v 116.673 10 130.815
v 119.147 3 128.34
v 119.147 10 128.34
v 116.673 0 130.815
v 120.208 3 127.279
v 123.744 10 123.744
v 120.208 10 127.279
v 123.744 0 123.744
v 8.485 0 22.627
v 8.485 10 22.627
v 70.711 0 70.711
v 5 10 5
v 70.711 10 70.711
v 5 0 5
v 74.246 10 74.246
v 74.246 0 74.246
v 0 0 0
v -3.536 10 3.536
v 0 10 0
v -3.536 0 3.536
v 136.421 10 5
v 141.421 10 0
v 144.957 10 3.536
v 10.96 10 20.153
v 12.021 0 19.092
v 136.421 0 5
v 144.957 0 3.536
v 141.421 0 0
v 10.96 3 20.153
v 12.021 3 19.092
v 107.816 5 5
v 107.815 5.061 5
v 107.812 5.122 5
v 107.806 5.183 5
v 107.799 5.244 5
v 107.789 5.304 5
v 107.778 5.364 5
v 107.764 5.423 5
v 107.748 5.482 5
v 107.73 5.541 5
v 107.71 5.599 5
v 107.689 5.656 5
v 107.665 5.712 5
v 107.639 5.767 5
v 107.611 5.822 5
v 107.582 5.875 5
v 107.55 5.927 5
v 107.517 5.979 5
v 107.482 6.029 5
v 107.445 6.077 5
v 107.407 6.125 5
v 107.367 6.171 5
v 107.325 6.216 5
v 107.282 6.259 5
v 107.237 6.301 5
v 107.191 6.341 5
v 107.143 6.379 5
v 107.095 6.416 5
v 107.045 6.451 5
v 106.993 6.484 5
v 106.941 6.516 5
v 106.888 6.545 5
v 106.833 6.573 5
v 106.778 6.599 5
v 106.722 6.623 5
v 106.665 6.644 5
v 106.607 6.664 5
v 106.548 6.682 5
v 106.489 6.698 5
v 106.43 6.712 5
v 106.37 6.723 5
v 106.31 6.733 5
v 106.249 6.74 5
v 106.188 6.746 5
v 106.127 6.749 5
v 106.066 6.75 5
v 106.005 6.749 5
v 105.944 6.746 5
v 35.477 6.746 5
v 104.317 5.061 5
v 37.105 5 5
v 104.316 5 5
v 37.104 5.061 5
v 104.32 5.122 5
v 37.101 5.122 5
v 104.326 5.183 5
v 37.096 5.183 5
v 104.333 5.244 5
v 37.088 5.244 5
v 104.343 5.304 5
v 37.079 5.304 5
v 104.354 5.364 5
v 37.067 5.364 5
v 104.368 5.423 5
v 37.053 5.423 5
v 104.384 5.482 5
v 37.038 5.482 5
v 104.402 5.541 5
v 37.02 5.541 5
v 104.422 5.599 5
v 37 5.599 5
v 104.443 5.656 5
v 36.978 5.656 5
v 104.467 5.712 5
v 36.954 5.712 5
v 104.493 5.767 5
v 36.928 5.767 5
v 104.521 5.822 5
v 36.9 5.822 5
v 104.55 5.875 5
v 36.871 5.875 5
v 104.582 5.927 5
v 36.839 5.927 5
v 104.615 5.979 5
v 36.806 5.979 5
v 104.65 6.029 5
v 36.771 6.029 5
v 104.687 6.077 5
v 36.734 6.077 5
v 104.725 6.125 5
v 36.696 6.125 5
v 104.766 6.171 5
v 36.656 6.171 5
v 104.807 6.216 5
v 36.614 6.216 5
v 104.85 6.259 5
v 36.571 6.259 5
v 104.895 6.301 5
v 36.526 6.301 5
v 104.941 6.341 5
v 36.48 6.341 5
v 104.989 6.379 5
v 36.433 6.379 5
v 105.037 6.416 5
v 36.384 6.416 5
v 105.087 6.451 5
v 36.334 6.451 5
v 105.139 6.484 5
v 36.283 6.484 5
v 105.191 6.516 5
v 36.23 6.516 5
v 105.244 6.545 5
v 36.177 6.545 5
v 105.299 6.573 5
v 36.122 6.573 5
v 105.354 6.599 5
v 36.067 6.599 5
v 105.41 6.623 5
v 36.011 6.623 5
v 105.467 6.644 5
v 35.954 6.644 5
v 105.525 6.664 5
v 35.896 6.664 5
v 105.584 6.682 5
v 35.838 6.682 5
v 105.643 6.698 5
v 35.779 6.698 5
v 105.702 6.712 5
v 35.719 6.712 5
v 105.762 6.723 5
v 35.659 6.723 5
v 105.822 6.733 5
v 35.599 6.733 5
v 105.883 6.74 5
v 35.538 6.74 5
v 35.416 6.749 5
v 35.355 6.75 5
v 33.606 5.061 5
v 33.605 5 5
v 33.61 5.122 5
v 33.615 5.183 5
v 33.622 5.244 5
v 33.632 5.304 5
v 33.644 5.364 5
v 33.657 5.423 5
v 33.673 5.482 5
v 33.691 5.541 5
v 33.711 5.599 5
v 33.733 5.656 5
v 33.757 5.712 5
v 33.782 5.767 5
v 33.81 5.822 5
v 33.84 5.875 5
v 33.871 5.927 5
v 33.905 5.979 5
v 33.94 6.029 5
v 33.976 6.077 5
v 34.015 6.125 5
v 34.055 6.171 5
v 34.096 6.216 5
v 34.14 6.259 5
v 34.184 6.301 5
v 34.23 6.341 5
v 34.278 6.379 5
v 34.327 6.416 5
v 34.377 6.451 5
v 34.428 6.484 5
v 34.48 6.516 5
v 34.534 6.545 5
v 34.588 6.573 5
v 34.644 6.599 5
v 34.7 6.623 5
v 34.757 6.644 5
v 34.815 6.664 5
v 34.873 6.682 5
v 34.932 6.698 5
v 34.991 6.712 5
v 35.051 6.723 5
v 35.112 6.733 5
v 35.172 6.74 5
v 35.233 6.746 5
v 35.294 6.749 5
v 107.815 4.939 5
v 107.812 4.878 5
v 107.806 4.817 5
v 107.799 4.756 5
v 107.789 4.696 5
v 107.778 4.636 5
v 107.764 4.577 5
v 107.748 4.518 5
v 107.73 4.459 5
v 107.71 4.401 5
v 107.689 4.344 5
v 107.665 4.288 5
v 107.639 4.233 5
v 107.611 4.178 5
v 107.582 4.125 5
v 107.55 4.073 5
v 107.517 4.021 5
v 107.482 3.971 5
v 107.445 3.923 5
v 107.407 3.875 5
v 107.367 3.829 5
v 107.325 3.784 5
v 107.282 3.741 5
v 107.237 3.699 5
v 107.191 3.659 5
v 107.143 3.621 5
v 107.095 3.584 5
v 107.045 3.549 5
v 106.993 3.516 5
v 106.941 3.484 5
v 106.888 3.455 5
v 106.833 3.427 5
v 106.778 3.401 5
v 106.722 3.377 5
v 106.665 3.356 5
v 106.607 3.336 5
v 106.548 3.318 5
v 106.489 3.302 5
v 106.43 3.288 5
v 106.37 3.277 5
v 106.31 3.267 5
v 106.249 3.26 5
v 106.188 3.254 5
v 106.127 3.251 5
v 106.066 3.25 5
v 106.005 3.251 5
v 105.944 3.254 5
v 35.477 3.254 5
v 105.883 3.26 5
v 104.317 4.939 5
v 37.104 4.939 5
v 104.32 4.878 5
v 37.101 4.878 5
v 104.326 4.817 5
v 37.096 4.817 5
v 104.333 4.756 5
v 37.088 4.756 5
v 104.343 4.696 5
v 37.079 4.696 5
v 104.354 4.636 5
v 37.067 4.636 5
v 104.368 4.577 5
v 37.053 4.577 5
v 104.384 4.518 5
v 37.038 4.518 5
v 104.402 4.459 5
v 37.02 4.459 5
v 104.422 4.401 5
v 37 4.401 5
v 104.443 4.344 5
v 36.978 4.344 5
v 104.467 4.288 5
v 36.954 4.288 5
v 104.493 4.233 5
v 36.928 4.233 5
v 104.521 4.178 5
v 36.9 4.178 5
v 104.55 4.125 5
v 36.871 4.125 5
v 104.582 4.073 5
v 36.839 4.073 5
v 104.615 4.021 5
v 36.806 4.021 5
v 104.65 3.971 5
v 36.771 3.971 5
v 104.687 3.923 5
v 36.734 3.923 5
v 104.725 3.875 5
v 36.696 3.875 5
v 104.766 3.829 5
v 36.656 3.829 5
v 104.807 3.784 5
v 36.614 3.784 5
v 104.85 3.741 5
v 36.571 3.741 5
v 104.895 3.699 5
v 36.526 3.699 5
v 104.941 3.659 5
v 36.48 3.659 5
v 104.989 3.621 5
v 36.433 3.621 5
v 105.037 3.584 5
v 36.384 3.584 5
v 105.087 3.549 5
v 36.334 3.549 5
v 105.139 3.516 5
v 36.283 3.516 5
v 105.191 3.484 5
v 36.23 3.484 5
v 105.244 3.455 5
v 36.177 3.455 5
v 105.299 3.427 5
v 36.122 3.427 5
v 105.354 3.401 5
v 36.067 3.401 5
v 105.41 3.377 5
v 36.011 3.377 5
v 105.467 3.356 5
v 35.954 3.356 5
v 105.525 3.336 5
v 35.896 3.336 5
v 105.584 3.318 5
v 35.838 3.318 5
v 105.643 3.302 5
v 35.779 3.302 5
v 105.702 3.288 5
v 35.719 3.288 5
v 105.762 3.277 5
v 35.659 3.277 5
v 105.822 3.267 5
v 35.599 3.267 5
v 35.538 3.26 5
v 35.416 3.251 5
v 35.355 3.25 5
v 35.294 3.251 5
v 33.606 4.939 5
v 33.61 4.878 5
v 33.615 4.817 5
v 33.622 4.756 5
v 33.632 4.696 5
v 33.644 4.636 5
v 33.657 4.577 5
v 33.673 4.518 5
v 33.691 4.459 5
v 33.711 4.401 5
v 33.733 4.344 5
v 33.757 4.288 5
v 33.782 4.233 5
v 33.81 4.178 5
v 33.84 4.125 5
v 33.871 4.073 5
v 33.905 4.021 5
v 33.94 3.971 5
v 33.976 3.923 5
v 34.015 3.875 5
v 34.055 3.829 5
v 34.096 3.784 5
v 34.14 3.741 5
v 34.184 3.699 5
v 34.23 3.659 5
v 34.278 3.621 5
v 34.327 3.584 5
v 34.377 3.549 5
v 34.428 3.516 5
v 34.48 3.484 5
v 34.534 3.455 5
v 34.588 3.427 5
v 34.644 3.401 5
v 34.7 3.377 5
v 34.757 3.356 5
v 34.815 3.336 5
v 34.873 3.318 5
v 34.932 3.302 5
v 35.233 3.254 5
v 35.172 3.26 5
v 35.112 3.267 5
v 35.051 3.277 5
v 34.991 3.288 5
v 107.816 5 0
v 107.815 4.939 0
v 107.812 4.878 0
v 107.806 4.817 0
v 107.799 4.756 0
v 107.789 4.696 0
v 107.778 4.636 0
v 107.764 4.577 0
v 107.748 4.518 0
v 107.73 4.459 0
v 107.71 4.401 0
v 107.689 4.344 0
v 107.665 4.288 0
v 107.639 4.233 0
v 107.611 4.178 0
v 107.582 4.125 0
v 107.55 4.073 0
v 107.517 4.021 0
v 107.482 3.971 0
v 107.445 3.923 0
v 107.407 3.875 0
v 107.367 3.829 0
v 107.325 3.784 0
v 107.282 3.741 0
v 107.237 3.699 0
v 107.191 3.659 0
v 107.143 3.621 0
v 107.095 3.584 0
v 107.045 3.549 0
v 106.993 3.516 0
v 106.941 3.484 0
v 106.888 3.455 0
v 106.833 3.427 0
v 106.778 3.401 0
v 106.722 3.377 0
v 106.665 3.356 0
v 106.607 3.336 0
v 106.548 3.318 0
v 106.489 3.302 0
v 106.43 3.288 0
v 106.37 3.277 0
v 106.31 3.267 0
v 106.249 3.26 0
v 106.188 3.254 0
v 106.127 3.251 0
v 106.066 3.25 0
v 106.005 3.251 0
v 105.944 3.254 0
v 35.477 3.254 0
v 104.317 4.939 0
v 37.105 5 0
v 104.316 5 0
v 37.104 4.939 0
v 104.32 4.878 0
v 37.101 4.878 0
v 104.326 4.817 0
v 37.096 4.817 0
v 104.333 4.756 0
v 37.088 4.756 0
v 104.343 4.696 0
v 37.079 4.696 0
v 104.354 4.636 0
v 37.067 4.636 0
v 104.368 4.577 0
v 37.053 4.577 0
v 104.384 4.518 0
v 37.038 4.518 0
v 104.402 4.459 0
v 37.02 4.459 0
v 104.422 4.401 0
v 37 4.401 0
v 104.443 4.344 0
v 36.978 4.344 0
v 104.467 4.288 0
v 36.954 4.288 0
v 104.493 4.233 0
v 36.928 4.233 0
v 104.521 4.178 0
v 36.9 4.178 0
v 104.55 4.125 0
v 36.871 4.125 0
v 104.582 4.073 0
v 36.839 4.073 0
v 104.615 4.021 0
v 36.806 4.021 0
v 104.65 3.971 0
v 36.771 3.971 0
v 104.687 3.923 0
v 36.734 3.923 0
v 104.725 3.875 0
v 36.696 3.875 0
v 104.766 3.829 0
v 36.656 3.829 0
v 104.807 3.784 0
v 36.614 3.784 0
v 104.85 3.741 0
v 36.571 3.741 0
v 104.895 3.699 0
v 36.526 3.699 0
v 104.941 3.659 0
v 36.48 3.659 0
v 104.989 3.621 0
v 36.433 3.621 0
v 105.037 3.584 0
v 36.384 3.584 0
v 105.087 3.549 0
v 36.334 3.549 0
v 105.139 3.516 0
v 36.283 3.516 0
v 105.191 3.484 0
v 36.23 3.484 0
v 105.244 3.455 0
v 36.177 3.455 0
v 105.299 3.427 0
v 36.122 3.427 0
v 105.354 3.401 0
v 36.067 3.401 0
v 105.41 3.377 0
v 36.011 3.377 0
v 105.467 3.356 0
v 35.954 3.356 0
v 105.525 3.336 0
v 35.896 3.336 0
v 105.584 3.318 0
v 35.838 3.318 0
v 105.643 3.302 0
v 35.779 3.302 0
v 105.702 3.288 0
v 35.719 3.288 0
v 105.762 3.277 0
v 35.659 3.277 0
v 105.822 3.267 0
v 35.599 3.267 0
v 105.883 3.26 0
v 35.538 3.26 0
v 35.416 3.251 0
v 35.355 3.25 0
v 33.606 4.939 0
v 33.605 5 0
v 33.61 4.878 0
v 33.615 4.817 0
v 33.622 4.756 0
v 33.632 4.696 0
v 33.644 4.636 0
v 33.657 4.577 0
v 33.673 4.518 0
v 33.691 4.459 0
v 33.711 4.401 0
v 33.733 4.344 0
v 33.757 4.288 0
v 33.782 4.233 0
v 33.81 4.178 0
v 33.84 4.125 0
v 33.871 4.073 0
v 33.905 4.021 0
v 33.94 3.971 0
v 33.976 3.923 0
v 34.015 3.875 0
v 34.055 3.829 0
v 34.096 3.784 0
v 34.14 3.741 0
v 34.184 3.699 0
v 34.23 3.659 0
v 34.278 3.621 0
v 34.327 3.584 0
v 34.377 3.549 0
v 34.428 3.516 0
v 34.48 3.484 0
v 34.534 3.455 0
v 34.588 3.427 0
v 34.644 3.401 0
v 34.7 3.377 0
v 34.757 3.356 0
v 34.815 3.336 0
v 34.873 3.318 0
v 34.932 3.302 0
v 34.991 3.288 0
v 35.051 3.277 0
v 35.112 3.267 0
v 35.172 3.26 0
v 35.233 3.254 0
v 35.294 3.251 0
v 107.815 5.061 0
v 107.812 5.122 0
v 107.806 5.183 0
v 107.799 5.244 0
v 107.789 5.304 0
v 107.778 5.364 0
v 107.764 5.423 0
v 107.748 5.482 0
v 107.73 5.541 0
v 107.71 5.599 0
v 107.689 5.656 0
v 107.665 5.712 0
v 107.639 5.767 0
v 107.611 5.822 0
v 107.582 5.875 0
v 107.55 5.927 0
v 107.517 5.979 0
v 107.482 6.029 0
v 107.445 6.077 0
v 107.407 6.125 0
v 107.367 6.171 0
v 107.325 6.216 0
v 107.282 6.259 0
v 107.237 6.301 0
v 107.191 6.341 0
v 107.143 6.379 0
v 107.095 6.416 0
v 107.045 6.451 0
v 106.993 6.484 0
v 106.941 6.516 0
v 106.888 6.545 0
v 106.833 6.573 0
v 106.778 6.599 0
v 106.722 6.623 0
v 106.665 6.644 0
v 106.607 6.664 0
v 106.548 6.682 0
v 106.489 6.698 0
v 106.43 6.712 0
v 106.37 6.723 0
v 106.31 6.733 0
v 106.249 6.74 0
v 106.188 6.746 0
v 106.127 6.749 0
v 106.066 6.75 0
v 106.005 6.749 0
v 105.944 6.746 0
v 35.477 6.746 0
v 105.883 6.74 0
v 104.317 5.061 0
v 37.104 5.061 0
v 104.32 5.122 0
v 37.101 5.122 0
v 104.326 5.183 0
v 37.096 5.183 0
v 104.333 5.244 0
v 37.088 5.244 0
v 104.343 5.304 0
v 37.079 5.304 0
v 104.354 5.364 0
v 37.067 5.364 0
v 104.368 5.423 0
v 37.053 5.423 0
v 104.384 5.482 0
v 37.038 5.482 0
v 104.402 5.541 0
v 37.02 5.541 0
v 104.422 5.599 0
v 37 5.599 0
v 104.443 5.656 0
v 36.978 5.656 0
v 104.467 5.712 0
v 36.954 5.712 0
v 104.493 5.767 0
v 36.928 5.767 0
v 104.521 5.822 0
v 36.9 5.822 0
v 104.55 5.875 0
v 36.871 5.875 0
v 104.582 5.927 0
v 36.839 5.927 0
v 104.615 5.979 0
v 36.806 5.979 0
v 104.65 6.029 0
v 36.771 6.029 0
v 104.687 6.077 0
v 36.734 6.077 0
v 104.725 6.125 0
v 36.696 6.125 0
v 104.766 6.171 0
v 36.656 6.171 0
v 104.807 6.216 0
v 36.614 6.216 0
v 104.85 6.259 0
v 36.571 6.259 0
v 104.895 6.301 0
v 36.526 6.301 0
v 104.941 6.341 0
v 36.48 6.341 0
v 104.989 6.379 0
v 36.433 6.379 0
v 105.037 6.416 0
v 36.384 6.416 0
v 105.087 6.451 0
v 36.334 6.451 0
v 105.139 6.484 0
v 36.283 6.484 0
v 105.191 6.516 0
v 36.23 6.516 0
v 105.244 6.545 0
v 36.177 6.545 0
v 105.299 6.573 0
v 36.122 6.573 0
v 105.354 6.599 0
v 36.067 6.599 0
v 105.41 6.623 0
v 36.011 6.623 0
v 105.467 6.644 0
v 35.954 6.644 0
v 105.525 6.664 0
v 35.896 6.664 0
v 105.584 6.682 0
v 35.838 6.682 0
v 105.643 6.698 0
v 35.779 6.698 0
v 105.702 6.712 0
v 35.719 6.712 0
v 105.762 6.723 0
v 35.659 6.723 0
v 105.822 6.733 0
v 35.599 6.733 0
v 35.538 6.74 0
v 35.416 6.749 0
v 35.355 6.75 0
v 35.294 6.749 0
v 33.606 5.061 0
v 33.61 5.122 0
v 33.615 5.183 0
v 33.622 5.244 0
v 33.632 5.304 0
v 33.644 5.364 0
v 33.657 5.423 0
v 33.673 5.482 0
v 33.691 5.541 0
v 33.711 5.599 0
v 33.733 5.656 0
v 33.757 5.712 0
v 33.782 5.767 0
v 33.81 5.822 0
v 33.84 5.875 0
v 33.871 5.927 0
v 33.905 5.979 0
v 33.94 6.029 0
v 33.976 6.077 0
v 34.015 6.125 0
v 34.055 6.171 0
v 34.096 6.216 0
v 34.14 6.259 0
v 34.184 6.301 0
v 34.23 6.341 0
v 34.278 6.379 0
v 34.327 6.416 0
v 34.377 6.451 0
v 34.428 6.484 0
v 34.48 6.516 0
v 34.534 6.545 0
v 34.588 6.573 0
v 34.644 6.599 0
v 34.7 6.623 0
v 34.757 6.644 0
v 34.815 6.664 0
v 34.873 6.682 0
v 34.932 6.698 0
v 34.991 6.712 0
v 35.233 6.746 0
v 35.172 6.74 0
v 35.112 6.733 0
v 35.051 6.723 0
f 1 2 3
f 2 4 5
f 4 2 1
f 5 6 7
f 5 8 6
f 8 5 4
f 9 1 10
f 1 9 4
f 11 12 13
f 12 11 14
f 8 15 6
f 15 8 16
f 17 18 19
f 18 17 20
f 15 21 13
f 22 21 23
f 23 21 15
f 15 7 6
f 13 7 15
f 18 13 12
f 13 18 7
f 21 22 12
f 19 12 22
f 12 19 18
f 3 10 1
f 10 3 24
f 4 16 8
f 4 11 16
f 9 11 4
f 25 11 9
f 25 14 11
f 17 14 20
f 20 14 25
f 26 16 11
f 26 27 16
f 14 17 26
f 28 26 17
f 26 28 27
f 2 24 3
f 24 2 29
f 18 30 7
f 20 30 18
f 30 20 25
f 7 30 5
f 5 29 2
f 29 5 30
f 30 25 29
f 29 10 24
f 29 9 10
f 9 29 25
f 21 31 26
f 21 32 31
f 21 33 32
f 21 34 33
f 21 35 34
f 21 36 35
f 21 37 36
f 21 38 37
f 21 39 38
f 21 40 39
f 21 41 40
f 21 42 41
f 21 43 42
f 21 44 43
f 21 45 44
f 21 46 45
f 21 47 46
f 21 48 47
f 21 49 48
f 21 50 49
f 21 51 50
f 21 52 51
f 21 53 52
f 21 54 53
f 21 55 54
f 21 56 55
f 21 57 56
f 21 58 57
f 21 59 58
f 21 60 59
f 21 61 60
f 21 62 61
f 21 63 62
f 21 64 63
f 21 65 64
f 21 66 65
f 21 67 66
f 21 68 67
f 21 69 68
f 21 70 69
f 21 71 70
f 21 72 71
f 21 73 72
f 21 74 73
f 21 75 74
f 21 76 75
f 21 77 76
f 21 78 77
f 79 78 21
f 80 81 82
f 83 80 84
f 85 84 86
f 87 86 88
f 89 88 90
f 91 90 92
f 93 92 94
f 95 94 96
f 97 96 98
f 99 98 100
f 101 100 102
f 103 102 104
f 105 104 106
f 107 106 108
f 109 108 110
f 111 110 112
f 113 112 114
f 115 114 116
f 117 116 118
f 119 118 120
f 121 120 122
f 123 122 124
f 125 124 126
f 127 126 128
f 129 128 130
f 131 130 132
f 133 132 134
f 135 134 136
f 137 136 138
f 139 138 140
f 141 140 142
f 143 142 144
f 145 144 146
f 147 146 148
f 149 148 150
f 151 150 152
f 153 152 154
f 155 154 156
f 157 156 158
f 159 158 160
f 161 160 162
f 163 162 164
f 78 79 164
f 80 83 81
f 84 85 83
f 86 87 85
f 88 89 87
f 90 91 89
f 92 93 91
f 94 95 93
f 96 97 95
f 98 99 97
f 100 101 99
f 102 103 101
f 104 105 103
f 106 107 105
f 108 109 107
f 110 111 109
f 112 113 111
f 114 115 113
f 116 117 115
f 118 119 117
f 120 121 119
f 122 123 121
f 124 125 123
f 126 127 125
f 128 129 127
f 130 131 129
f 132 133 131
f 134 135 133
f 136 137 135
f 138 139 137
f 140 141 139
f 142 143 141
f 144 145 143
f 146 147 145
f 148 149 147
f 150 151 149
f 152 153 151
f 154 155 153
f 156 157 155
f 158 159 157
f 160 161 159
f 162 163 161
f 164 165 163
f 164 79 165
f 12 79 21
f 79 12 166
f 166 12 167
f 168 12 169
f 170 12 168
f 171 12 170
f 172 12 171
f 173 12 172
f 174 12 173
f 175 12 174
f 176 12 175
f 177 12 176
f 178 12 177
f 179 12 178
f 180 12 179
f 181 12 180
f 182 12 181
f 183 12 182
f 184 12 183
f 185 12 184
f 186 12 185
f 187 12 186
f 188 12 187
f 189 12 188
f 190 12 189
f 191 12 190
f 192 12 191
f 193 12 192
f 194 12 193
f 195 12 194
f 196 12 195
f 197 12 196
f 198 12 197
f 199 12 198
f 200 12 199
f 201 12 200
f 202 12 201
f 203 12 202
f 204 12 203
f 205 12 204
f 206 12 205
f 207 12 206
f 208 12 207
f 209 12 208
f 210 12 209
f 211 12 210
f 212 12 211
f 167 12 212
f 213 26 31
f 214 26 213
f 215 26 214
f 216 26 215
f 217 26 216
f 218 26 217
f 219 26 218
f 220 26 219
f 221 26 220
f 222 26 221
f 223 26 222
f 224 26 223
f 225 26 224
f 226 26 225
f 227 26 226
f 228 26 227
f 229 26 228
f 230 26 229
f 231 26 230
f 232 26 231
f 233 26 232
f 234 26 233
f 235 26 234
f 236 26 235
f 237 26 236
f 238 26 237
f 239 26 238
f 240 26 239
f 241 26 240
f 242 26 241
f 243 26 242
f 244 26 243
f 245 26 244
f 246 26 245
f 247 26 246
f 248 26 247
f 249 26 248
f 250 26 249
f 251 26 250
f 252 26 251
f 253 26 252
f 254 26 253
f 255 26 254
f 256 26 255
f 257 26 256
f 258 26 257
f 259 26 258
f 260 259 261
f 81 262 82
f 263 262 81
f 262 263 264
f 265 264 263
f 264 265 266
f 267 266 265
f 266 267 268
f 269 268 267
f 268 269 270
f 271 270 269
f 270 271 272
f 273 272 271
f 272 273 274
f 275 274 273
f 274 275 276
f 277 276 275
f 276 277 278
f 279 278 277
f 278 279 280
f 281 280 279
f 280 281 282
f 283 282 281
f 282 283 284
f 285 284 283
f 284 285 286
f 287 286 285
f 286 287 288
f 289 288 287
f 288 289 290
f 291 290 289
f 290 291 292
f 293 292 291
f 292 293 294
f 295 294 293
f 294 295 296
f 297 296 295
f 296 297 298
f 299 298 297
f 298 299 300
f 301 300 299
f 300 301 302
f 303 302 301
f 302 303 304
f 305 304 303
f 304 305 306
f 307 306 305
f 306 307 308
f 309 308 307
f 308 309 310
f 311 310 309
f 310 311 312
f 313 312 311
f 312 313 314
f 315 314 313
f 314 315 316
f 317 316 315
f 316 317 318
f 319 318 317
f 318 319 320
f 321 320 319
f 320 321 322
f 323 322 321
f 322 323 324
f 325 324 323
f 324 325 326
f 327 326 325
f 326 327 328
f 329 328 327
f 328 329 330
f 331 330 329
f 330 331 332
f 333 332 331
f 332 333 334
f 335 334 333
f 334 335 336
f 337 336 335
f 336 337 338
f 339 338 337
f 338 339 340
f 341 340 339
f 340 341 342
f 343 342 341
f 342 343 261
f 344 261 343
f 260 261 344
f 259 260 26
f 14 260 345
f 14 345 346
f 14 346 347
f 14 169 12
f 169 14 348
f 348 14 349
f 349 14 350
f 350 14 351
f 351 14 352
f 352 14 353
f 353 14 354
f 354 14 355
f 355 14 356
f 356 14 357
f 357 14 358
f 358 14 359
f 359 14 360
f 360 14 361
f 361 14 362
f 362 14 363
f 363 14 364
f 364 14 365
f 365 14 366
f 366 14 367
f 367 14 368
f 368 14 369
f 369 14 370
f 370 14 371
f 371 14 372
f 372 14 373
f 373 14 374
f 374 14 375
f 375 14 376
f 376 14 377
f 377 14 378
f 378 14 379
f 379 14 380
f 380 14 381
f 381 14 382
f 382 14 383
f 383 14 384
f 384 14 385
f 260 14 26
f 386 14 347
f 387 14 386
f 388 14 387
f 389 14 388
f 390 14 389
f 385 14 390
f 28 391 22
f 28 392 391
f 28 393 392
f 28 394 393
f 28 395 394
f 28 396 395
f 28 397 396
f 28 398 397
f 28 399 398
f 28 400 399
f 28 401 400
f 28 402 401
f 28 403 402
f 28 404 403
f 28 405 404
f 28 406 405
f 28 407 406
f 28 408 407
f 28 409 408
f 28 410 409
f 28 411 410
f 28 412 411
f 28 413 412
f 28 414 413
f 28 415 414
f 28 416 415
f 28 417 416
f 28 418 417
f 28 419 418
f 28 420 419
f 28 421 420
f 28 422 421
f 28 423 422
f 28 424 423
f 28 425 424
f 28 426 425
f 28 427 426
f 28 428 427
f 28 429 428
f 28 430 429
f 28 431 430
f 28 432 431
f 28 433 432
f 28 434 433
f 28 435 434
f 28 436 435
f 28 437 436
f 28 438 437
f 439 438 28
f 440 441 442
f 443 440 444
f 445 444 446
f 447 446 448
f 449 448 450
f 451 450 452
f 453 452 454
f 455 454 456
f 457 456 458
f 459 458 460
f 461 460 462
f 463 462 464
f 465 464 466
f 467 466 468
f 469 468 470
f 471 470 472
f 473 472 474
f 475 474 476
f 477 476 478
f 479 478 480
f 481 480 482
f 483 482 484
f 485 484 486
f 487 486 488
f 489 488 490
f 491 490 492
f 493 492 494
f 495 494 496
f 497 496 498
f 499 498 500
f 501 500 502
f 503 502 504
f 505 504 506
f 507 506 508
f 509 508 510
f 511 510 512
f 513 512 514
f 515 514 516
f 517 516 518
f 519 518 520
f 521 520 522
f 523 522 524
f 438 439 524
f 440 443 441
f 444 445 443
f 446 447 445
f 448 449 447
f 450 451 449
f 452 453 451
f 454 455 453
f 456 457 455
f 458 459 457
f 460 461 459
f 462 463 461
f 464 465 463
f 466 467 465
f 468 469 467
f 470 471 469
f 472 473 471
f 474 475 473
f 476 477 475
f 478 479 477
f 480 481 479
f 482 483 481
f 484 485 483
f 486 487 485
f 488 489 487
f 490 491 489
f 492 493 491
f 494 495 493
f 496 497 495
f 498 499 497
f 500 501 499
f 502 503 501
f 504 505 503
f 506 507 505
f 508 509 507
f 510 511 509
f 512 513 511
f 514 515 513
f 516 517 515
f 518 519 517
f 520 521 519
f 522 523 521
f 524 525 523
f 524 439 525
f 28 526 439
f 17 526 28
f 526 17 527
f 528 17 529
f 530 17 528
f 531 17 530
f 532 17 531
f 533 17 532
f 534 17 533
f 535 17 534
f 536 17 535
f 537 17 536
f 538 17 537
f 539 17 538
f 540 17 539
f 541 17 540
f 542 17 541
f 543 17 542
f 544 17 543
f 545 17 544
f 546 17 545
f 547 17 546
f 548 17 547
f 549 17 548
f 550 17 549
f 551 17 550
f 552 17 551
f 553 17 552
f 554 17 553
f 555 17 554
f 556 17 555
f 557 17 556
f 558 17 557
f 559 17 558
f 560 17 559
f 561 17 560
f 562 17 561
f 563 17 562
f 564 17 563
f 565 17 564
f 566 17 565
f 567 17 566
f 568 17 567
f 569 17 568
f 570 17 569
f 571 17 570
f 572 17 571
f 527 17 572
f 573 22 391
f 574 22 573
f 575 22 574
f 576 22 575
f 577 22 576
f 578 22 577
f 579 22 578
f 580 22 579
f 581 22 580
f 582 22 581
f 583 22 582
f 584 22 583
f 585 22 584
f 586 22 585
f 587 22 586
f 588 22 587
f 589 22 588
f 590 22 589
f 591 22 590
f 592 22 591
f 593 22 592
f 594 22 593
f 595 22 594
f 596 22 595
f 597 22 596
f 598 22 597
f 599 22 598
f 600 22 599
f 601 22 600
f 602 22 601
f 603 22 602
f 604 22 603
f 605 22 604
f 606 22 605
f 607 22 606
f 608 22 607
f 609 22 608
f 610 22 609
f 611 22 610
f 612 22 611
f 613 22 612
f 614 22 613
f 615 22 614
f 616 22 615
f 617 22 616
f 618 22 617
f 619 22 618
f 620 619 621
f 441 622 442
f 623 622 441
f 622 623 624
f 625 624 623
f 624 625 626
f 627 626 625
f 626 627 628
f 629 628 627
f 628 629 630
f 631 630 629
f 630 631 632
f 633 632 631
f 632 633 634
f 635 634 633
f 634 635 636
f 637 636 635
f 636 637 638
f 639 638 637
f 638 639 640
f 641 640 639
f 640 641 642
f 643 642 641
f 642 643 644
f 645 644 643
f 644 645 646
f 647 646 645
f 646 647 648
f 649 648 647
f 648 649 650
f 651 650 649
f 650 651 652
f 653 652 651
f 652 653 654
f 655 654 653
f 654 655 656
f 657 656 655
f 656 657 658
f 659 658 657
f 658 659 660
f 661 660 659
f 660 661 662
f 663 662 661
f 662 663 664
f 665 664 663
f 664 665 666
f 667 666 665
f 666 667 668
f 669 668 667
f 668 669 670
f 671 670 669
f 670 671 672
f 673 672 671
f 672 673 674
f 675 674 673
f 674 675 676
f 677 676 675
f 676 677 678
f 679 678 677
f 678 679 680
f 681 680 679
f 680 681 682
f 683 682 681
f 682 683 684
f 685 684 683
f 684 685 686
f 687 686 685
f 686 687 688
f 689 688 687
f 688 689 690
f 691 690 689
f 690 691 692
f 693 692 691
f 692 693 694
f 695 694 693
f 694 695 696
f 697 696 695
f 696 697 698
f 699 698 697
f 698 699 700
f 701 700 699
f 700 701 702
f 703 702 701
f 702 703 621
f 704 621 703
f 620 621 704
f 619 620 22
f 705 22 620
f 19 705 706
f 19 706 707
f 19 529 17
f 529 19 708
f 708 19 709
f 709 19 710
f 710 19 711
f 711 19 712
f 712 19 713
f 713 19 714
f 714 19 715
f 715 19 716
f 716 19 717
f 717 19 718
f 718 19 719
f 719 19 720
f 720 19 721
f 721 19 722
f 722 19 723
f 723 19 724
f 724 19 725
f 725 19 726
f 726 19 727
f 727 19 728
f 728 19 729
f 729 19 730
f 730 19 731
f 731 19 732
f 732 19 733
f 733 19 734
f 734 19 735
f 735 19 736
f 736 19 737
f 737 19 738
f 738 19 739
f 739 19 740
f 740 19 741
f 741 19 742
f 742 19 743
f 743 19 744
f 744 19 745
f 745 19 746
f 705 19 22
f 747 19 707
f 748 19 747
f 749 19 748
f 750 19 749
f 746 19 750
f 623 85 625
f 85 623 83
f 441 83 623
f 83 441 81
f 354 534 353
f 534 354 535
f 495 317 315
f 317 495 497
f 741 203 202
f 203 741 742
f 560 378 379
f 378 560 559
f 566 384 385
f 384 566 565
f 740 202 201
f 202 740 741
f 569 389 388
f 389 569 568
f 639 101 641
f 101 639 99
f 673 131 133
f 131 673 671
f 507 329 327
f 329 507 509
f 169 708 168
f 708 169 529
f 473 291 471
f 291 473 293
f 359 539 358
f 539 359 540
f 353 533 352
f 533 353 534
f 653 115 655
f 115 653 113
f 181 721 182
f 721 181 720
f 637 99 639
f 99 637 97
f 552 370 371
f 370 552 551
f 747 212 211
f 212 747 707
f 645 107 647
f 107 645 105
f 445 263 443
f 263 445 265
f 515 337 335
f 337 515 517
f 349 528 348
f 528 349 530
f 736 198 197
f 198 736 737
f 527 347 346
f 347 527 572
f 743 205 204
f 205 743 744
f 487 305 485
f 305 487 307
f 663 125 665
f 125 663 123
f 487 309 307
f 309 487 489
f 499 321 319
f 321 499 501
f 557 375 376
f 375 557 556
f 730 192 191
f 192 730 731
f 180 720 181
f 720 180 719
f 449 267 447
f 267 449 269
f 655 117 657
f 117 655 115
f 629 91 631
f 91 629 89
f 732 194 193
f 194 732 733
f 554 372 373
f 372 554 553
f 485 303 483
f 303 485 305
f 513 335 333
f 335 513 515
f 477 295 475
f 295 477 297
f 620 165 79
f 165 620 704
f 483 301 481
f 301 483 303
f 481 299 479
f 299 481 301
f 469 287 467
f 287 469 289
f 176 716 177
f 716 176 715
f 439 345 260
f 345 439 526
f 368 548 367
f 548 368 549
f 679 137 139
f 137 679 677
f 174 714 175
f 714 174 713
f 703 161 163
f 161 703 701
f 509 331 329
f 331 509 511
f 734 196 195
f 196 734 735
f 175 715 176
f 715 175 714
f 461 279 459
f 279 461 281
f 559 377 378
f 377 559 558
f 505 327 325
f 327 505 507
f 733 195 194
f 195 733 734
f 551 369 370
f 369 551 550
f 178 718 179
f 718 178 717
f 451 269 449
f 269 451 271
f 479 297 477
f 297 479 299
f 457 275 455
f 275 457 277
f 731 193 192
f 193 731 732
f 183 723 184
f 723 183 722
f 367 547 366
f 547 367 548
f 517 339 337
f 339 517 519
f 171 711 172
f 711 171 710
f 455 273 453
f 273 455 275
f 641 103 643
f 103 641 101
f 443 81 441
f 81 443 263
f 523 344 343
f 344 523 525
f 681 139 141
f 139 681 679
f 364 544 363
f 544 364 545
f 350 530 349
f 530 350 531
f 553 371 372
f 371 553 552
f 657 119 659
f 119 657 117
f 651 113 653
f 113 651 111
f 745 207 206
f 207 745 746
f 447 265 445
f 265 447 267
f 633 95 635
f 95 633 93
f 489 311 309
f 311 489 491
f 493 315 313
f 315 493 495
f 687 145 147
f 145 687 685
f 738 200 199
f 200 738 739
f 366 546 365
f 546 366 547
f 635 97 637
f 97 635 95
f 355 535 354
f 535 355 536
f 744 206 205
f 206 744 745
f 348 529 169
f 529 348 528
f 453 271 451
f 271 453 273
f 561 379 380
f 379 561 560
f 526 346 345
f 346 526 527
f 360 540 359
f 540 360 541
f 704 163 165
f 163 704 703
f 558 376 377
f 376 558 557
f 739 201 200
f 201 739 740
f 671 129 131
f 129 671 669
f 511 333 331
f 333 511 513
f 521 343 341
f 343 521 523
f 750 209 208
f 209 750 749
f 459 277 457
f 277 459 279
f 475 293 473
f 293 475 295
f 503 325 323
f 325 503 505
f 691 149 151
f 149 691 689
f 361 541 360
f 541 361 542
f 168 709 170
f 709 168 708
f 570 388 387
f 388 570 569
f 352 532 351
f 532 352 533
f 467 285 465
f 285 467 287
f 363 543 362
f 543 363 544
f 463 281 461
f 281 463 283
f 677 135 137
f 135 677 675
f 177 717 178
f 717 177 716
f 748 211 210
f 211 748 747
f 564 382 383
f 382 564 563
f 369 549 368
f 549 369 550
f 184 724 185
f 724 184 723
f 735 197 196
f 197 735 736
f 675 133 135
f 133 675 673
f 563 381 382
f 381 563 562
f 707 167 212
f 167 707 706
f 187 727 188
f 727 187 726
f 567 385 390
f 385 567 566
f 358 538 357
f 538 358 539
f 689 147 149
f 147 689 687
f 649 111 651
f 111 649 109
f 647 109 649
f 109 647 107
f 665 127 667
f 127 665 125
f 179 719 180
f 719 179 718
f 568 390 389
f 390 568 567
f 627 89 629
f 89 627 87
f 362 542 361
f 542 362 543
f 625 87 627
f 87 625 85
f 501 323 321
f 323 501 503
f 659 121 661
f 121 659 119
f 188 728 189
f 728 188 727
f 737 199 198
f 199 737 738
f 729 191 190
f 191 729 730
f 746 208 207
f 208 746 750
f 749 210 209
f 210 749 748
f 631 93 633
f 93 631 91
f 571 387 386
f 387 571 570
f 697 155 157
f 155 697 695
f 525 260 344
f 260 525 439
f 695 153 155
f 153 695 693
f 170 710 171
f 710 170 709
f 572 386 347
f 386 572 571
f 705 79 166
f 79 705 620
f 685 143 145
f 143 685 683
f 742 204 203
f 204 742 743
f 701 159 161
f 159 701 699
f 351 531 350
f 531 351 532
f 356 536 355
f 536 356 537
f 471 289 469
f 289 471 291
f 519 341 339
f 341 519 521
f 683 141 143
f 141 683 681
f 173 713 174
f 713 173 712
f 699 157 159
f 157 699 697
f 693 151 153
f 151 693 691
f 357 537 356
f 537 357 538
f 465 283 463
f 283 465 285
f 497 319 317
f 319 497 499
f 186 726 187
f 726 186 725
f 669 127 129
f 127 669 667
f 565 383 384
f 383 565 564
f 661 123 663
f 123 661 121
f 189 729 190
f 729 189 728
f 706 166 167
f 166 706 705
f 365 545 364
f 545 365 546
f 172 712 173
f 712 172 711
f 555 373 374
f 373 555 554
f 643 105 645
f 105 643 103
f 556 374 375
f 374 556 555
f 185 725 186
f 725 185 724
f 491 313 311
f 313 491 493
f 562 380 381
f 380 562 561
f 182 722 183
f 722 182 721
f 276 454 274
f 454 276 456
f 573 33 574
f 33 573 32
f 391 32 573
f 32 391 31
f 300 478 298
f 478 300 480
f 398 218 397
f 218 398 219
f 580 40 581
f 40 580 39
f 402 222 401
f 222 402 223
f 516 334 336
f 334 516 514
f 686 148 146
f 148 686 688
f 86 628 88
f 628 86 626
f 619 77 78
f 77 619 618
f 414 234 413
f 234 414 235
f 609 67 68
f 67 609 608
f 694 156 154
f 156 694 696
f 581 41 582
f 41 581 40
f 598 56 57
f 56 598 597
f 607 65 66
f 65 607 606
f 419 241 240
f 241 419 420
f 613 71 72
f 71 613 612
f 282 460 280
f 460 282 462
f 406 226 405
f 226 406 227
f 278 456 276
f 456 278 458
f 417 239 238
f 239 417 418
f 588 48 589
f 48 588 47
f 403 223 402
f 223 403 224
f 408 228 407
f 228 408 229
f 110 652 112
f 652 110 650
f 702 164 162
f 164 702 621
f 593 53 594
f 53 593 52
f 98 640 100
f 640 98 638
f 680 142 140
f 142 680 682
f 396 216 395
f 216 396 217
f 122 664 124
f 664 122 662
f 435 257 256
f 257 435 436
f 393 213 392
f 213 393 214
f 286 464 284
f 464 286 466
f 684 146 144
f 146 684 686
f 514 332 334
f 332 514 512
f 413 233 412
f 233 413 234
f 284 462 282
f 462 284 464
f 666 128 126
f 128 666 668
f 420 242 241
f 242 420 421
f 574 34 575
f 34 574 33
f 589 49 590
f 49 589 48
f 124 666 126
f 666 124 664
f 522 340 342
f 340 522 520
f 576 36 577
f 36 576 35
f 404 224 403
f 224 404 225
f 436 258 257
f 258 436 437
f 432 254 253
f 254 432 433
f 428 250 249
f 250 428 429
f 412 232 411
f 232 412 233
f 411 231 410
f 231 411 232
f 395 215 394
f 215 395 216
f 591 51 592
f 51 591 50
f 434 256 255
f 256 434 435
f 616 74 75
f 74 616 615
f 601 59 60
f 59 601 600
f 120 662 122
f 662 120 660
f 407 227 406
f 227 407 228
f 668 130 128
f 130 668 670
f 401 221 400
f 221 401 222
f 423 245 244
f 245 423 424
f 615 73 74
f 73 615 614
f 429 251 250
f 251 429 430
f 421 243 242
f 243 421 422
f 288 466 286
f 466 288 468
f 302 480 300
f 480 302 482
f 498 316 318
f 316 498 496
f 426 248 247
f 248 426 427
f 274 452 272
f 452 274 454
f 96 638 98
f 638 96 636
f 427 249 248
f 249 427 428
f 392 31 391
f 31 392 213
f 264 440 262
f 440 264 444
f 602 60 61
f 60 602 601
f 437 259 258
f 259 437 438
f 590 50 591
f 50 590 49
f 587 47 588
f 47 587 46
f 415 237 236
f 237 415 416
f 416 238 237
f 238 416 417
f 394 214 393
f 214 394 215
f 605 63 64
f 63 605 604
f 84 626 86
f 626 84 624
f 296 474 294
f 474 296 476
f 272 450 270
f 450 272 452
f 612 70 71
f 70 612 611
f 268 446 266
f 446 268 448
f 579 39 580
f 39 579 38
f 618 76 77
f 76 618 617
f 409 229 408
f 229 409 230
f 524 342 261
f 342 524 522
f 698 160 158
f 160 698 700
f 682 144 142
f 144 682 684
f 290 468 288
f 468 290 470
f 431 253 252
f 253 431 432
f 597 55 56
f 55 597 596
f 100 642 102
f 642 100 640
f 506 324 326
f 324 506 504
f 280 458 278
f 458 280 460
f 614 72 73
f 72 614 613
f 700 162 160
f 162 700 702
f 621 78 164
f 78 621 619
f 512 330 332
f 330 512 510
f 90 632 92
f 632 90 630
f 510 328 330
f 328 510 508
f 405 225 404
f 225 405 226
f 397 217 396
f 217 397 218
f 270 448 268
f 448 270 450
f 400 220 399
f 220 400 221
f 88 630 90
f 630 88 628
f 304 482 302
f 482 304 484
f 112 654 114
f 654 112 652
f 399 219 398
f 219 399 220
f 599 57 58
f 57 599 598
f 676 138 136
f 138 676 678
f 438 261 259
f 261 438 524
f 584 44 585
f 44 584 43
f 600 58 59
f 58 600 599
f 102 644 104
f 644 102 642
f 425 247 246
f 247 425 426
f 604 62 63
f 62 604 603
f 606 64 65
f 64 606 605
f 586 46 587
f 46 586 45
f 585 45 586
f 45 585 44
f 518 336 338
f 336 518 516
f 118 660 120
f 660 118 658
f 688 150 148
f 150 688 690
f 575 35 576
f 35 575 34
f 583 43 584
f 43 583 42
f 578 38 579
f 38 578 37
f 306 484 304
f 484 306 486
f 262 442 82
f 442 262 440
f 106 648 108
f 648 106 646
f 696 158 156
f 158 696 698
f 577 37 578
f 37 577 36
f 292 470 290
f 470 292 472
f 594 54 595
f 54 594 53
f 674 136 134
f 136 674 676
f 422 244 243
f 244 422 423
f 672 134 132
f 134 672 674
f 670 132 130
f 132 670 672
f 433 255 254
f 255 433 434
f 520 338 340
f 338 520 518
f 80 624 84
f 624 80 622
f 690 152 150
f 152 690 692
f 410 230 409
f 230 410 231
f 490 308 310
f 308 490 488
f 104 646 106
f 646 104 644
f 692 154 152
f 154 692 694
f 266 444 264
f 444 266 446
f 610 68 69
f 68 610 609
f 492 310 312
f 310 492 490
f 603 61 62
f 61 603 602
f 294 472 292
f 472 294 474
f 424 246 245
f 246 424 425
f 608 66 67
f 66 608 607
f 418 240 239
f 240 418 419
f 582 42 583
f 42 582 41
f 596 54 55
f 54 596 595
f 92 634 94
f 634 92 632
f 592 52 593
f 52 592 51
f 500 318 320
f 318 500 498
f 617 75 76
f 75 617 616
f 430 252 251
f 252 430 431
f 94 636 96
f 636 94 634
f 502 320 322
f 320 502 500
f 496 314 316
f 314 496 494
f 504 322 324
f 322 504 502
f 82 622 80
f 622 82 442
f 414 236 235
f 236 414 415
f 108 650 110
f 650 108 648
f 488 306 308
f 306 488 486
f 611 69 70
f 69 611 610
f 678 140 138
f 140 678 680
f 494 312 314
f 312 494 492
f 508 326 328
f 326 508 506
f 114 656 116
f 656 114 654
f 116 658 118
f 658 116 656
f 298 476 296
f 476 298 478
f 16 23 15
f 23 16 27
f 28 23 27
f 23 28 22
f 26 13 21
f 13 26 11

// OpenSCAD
// Panel length (mm)
length = 155;

// Support bar position (mm)
barPos =100;

// Panel angle (max 55 degrees)
angle = 45;

// Channel witdh
channel = 1.5;

// Screw hole diameter (mm)
diameter = 3.5;

// Mirror model?
mirror = 0;

module solarBracket(){
    if(mirror == 0){
        Bracket();
    } else {
       translate([0,-50,0]){
            mirror([0,1,0])
                    Bracket();
        }
    }
}solarBracket();

module Bracket(){
    a =tan(angle)*barPos;                  // support lenght
    h = sqrt(pow(barPos,2)+pow(a,2));     // Base lenght
    difference(){
        rotate([0,-angle,0]){
            difference(){
                cube([length+20,10,10]);       
                
                translate([0,3,5])
                    cube([length+20,17,channel]);
                
                translate([0,0,5])
                    cube([22,10,10]);
            }
           
            translate([barPos,0,-a])
                cube([5,10,a]);
            
            rotate([0,angle,0]){
                difference(){
                    cube([h,10,5]);
                    
                    spacing = h/4;
                    translate([spacing,5,0])
                         cylinder(h=10, d=diameter,$fn=180);
                    
                    translate([3*spacing,5,0])
                        cylinder(h=10, d=diameter,$fn=180);
                }
            }
        }
        translate([20,20,0])
            cube([20,20,20]);
    }
}
